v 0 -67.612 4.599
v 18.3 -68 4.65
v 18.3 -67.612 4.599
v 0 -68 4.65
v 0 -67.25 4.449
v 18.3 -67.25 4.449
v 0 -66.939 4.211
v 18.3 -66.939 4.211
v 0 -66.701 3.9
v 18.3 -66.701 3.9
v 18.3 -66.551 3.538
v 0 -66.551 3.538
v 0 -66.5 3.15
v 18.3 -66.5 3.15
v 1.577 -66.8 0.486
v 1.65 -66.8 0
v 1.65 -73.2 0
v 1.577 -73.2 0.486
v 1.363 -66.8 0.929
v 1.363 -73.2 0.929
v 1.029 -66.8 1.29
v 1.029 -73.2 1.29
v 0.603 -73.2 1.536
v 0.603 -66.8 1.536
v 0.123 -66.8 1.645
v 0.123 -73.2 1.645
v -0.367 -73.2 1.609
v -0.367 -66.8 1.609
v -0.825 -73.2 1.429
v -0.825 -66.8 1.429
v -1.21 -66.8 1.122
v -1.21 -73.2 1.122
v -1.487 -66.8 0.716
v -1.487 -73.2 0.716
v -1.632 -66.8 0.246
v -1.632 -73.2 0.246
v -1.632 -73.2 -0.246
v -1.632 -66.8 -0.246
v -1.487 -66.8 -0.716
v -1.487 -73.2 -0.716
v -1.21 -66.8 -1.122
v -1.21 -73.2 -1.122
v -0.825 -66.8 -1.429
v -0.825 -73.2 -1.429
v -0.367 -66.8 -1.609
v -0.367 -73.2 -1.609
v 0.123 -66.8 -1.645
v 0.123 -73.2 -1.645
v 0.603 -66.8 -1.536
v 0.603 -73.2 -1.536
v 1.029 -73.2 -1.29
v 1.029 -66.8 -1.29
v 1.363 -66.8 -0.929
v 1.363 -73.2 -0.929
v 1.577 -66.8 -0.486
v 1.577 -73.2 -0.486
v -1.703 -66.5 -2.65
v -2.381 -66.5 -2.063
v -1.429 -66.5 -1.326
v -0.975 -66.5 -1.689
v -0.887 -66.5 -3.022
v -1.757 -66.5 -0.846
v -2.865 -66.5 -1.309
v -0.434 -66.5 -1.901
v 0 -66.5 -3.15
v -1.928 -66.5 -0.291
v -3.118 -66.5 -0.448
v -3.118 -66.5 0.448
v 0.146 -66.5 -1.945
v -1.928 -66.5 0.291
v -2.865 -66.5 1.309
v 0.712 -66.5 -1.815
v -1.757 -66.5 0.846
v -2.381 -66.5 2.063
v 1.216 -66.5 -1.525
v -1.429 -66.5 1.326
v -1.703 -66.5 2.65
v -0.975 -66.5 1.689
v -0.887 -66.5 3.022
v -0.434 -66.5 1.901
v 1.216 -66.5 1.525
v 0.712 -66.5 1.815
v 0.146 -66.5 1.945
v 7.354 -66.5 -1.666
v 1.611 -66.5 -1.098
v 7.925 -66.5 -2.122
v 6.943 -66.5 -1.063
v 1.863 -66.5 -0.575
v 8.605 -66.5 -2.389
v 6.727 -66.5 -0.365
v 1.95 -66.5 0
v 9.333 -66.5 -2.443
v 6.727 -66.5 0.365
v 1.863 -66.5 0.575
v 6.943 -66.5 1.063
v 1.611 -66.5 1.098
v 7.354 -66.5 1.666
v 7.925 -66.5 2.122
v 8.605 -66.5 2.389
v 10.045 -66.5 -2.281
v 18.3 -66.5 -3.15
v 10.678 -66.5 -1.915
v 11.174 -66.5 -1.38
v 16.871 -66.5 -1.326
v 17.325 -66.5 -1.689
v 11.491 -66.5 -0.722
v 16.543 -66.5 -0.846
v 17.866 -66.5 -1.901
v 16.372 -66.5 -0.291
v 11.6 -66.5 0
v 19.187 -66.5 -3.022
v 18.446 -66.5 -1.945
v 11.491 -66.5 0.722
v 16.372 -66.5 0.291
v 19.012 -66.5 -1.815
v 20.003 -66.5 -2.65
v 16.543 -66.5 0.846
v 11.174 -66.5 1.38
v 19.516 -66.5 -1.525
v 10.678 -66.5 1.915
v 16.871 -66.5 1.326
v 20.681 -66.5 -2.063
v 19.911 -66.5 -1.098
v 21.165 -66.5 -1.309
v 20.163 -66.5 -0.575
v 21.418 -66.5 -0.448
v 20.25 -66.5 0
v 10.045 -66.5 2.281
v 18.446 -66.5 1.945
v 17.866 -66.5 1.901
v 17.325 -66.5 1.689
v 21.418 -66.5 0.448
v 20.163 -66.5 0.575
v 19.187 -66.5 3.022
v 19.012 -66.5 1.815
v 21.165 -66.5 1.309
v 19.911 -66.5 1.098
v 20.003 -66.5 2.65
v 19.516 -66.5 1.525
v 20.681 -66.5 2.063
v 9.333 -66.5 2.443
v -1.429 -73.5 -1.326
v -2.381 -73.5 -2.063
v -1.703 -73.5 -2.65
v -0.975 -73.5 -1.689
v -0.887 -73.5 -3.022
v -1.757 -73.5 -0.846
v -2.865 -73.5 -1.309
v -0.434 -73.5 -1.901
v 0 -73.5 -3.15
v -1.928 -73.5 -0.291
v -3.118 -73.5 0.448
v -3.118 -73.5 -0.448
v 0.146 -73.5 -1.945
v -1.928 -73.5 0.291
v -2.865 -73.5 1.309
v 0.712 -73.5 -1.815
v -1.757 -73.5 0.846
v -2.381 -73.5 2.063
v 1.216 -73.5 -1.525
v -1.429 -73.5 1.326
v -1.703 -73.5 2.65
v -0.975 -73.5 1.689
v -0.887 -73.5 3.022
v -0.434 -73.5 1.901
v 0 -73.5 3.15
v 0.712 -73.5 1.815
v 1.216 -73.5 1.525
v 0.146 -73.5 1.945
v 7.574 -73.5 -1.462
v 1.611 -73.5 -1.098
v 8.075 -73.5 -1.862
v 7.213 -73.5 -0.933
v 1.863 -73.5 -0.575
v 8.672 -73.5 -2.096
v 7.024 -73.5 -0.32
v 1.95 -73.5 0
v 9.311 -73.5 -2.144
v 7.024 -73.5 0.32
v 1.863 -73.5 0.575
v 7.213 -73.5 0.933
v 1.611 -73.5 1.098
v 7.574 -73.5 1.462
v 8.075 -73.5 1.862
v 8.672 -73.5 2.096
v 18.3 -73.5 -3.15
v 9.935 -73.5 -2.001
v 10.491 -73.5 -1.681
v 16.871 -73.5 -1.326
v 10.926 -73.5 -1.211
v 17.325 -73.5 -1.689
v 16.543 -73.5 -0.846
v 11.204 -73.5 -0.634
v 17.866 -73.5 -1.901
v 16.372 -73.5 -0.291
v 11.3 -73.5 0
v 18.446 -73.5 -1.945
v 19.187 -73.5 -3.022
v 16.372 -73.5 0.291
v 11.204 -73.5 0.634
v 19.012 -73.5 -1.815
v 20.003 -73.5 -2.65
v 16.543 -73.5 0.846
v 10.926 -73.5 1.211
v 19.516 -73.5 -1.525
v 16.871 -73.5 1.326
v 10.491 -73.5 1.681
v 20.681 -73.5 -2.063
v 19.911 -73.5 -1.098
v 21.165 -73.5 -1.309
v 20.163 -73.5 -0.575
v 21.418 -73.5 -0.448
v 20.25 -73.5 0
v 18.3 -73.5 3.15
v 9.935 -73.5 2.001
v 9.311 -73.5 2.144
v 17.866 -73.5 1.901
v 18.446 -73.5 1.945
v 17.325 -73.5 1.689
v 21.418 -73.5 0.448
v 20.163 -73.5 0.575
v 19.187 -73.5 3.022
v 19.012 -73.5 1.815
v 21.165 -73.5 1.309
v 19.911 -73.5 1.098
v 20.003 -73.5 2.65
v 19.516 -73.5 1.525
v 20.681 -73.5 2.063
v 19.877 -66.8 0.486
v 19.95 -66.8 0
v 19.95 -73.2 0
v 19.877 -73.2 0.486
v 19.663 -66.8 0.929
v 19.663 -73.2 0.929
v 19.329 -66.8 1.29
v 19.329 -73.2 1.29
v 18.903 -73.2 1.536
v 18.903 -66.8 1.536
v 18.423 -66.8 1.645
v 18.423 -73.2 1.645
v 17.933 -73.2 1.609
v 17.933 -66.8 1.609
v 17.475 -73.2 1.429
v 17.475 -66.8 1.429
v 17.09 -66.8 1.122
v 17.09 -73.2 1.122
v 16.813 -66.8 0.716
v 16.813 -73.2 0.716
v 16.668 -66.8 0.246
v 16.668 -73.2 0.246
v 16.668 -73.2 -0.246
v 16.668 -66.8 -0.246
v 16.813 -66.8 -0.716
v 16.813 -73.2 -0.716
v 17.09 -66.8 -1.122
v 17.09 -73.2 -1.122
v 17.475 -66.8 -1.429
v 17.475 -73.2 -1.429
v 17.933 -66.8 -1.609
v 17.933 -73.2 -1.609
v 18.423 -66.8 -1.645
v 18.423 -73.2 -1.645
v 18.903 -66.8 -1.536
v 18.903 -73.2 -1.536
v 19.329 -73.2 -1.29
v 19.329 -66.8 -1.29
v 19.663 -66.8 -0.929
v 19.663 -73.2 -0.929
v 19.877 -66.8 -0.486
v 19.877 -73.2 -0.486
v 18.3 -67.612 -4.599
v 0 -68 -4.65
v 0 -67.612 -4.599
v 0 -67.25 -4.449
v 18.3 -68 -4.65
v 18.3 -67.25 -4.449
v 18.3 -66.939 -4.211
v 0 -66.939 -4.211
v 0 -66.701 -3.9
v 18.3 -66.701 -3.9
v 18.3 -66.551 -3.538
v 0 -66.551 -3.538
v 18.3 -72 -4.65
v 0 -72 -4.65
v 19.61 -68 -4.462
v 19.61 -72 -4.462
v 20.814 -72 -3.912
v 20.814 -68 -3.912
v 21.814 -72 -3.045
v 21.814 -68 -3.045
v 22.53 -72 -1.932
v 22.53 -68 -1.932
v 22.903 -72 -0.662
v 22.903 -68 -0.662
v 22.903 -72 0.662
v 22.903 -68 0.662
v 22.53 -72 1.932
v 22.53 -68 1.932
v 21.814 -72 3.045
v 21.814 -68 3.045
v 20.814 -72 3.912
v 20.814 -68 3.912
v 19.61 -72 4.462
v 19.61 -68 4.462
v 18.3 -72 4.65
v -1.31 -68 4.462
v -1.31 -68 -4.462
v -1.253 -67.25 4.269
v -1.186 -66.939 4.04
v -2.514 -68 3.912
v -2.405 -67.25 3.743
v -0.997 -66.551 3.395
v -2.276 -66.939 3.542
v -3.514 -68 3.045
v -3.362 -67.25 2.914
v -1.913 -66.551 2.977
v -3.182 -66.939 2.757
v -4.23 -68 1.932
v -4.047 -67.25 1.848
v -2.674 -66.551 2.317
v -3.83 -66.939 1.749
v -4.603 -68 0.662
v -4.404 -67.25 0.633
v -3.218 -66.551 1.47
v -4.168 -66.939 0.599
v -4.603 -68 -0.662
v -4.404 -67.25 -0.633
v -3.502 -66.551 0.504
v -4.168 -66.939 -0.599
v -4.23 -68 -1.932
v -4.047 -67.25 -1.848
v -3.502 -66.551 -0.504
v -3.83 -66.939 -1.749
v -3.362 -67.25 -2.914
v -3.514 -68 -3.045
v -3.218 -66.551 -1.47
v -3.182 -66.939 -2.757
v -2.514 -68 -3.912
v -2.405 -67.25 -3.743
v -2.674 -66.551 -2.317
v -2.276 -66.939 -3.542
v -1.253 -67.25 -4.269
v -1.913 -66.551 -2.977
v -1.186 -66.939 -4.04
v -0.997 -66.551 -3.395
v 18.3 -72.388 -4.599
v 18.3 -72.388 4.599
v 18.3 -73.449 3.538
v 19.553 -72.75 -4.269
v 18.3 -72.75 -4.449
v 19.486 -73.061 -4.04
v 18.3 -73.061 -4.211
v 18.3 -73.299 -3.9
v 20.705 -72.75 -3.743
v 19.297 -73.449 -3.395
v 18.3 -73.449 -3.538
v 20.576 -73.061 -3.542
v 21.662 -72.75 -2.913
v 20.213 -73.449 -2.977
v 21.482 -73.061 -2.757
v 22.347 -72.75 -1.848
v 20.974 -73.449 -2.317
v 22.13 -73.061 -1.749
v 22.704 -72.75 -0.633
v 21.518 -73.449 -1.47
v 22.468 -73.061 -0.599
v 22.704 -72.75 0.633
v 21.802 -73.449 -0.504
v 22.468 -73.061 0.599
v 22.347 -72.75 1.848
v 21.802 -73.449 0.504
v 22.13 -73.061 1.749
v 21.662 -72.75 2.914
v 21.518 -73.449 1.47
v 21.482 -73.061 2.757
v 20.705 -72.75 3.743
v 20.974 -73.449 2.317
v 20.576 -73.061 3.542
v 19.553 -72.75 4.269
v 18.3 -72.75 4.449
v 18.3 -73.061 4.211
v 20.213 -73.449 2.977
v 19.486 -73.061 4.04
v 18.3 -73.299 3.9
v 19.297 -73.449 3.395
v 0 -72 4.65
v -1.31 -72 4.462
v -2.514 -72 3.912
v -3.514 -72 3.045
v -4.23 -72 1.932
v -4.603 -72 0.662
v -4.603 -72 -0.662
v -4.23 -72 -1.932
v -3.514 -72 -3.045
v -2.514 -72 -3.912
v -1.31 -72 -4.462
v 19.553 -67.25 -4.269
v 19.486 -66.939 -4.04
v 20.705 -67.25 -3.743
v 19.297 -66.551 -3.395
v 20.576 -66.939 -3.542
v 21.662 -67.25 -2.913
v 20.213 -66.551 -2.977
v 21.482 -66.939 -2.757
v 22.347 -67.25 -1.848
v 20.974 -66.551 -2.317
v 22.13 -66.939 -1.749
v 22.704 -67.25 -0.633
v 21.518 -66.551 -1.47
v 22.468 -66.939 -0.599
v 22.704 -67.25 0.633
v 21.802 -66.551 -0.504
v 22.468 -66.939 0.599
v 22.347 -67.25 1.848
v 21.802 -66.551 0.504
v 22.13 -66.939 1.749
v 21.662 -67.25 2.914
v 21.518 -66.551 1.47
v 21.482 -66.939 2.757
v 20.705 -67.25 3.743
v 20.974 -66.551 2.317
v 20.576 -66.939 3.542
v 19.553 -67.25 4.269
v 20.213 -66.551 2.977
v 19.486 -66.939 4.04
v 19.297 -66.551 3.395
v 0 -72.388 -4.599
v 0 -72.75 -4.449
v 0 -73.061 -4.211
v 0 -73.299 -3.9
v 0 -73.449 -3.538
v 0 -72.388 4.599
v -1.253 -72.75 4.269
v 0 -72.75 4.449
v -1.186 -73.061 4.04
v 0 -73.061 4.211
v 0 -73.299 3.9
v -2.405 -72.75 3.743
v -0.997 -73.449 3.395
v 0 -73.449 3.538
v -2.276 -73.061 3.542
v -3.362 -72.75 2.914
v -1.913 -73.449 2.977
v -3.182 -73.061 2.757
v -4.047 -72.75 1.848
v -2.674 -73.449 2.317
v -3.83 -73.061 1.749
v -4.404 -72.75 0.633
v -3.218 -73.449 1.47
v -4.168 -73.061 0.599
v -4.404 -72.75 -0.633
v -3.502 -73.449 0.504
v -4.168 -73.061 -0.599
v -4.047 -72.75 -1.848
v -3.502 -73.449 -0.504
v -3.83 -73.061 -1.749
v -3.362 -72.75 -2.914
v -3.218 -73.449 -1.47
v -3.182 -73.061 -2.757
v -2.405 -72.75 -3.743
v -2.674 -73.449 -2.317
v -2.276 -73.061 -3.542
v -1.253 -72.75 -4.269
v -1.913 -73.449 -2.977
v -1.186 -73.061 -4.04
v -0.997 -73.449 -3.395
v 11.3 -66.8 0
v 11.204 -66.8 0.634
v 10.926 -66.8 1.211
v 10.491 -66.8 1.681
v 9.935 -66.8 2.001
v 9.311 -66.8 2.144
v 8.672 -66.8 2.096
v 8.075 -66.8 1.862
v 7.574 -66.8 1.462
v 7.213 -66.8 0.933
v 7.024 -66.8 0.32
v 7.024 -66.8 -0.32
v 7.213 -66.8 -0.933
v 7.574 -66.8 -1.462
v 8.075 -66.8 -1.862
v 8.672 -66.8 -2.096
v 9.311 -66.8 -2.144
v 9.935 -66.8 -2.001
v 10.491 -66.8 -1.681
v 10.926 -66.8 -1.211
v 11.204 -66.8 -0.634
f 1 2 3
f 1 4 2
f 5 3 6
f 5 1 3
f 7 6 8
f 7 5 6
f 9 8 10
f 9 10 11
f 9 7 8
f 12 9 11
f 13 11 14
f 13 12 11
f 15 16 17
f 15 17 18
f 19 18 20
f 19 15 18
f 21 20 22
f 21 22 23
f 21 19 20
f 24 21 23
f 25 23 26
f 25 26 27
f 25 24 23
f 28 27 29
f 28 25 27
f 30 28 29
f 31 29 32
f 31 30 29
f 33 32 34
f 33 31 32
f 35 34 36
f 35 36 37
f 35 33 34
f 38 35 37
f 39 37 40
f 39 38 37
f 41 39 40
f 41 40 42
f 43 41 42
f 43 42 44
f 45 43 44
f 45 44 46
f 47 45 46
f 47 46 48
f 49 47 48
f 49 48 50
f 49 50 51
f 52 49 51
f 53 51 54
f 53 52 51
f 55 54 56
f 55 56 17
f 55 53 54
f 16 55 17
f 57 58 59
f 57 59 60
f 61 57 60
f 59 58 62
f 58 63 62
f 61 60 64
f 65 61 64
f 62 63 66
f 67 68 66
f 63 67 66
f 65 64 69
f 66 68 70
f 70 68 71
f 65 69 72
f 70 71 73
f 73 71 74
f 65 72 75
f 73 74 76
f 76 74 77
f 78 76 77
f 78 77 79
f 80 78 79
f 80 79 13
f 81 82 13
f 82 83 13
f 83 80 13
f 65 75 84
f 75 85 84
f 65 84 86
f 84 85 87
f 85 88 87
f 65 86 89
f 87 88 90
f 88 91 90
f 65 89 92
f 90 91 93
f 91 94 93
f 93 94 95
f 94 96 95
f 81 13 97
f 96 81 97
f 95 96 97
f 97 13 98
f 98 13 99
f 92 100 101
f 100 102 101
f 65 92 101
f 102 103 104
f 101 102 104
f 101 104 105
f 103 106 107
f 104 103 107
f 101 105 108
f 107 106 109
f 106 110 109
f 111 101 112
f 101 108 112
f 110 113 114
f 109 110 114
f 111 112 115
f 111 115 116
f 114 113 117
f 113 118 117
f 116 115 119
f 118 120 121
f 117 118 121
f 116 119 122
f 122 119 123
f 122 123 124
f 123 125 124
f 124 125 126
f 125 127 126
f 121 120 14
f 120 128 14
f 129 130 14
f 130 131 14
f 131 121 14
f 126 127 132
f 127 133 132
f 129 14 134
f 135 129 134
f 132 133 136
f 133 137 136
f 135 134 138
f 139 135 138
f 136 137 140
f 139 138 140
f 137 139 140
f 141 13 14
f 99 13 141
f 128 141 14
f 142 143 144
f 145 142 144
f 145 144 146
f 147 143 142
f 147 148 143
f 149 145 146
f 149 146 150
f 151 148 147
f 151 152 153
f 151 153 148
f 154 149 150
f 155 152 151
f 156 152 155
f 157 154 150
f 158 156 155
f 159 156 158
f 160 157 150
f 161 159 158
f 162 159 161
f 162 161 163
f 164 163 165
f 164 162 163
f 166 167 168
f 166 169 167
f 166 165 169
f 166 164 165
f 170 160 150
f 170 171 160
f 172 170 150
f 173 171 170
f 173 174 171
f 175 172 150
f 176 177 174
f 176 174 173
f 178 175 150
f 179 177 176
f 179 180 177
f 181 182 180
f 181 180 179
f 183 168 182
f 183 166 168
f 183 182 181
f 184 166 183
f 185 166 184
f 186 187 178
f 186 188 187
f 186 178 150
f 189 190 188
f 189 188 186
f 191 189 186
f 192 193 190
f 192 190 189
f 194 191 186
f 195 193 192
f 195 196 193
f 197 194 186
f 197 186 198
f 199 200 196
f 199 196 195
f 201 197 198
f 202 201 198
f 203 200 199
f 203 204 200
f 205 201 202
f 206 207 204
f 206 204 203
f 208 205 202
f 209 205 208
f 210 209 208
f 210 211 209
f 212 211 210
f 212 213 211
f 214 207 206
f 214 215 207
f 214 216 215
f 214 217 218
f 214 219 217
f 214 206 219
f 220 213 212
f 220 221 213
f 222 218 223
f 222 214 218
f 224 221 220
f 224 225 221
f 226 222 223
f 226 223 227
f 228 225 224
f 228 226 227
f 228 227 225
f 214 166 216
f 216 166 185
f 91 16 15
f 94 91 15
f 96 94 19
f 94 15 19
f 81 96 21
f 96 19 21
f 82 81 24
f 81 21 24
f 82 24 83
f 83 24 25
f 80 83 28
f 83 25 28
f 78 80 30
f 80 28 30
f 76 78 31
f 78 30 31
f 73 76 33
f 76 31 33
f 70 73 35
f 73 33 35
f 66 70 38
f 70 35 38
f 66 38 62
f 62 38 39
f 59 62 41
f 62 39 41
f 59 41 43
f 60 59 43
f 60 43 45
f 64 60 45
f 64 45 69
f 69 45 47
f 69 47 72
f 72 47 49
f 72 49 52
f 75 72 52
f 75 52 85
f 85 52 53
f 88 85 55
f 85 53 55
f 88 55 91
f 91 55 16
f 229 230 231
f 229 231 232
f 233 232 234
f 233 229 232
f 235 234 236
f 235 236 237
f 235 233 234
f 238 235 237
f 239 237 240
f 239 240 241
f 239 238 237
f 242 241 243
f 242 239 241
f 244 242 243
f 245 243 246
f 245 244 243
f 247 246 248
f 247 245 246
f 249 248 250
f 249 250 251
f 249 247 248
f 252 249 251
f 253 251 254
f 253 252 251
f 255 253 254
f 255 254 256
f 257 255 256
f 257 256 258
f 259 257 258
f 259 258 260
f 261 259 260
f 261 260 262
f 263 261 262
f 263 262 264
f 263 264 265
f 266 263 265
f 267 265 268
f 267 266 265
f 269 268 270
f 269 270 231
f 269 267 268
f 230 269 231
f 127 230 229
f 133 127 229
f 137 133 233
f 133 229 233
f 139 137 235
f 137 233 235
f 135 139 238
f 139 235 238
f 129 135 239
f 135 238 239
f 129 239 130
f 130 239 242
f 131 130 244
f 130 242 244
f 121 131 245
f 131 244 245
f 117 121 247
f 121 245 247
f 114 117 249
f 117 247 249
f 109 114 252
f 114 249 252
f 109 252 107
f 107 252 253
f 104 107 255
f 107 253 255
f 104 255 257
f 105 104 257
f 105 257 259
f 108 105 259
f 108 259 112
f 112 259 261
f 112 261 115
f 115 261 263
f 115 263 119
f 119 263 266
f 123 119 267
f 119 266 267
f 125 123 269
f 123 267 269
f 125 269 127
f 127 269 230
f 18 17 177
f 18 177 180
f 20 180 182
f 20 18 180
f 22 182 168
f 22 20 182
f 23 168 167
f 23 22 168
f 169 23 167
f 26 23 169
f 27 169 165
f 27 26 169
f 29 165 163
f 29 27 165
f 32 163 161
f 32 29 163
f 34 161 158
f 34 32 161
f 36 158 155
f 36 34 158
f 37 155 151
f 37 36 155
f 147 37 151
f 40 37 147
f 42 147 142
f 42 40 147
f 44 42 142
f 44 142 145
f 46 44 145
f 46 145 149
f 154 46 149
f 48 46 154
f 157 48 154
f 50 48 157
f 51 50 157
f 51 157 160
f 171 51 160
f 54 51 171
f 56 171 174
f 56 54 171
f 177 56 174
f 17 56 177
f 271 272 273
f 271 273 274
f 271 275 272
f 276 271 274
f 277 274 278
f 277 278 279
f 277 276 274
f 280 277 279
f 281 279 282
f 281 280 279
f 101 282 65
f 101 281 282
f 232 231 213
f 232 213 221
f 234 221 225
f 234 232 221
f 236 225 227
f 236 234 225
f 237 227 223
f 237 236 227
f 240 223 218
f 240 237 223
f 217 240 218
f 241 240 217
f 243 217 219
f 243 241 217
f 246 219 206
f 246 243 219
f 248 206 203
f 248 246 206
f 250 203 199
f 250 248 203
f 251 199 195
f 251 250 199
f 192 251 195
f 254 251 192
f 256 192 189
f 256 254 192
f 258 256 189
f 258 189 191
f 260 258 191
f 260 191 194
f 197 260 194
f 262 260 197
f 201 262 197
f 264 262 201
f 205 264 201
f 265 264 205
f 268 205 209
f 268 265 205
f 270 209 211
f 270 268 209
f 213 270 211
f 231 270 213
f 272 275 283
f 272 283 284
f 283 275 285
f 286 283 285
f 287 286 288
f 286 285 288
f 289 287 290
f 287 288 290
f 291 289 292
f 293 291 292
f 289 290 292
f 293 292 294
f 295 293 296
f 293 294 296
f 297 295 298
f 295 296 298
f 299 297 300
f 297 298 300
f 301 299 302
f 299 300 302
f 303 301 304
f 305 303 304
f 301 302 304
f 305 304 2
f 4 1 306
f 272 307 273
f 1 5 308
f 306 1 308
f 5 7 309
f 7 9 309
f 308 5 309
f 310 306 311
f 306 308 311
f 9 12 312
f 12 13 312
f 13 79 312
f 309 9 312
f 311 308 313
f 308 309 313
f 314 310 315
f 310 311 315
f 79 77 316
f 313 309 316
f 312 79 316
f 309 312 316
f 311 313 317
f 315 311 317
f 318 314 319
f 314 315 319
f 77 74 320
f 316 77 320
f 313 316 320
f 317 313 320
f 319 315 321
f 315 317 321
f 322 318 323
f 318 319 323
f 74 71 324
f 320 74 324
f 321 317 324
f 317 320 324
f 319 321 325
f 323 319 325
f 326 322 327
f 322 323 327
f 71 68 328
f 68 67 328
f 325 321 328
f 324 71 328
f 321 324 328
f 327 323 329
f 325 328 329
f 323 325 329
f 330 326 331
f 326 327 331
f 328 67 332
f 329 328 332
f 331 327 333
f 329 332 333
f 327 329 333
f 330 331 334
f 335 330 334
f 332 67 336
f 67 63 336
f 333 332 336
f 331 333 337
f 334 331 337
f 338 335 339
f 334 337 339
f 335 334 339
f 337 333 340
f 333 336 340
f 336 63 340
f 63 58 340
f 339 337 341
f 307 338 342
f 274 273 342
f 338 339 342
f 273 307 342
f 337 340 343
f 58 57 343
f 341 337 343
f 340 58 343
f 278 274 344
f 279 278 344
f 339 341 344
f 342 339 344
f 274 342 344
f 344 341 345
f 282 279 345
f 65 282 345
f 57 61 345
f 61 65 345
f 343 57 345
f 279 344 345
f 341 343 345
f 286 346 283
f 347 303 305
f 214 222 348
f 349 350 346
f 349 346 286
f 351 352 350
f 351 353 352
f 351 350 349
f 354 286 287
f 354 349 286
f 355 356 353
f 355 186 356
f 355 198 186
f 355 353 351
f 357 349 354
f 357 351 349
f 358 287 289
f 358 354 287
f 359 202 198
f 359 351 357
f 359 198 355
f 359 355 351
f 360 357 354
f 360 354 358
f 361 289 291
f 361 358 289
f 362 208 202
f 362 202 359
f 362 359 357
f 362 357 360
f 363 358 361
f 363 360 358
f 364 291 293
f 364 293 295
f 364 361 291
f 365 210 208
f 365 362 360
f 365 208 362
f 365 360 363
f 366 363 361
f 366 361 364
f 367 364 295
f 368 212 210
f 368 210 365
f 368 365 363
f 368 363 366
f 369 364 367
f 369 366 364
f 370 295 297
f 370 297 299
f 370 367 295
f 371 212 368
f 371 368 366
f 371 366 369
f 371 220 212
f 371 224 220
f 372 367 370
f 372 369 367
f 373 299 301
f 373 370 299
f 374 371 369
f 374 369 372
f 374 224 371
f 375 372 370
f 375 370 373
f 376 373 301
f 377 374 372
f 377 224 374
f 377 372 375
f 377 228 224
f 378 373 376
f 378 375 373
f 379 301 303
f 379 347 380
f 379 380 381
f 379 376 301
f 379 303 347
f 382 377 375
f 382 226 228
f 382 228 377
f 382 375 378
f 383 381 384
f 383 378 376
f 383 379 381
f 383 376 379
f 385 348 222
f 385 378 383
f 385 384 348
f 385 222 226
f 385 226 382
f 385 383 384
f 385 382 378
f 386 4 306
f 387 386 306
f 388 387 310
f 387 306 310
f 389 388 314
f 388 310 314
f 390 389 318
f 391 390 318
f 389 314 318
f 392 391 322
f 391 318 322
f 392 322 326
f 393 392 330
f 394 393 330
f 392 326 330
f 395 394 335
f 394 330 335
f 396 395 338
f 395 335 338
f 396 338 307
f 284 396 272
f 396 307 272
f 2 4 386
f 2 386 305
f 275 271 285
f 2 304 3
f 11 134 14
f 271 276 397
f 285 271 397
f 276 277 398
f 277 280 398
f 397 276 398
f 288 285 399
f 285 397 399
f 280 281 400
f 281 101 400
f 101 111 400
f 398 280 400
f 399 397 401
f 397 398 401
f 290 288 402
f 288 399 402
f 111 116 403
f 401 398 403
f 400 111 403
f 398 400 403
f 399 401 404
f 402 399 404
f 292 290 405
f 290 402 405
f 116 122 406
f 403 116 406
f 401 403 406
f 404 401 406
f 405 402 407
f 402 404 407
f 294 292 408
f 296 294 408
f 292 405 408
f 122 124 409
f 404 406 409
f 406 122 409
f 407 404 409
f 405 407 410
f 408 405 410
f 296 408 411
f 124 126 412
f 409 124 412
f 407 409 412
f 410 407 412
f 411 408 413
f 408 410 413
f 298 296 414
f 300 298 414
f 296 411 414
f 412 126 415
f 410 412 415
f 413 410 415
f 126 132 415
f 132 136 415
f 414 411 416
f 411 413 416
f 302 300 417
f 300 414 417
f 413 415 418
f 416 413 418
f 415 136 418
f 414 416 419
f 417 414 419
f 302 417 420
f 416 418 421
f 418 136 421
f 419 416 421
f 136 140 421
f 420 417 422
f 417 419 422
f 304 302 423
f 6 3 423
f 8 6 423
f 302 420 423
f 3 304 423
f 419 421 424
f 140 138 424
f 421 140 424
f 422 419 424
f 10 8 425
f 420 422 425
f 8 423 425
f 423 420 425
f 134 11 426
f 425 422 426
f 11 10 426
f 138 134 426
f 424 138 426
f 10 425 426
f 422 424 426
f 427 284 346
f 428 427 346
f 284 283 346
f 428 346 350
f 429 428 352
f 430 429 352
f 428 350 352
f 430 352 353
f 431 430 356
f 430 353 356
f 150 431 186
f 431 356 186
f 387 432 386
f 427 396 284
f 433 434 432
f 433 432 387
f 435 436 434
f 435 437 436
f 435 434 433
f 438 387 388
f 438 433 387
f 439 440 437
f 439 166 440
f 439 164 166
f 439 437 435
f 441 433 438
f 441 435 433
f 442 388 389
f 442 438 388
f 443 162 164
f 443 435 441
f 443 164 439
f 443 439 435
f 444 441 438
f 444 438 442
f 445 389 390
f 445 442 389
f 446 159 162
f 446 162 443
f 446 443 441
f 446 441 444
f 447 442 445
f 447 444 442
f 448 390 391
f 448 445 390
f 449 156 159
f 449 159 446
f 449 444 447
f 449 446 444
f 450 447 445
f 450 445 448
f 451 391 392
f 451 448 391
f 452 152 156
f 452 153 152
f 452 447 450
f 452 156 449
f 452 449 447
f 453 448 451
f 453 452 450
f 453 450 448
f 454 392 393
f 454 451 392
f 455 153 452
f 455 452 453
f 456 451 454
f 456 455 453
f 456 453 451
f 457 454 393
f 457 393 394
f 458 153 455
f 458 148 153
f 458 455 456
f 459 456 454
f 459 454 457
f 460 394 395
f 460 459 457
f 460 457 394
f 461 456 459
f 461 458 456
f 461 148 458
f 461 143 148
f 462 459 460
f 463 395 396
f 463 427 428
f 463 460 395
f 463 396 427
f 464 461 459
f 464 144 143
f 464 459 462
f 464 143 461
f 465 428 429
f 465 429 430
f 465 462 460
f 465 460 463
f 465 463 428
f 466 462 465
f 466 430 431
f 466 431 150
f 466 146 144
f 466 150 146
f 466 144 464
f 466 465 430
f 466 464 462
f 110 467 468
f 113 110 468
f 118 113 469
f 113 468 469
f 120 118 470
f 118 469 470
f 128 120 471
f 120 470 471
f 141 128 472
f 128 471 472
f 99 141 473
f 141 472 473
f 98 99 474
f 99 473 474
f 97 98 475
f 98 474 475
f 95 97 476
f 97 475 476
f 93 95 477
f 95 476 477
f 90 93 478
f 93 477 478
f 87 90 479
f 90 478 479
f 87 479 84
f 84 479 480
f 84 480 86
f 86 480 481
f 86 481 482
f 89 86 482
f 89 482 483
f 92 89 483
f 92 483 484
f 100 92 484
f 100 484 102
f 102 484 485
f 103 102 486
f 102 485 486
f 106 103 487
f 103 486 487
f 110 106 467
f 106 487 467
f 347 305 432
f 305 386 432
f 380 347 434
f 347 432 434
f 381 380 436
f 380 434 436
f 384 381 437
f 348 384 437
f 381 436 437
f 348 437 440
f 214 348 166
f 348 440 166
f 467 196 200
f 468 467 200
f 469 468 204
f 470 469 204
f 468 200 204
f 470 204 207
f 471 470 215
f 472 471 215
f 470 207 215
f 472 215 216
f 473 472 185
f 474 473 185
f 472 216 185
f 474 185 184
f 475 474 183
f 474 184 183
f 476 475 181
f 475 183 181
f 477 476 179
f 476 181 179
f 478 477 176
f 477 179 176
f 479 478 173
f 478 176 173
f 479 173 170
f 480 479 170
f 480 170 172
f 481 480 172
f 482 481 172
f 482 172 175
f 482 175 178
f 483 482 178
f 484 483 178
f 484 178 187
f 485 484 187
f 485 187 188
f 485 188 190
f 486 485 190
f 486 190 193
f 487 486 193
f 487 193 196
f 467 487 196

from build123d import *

# Parameters (mm, degrees)
SKETCH003_R     = 1.65
PAD002_DEPTH    = 7
SKETCH004_R     = 2.15
POCKET003_DEPTH = 8
FILLET001_R     = 1.5
CHAMFER001_SIZE = 0.3


with BuildPart() as part:
    # Sketch003 → Pad002 (new body)
    with BuildSketch(Plane.XZ):
        with BuildLine():
            ThreePointArc((0, 4.65), (-4.65, 0), (0, -4.65))
            Line((18.300003, -4.65), (0, -4.65))
            ThreePointArc((18.300003, -4.65), (22.95, 2e-06), (18.3, 4.65))
            Line((0, 4.65), (18.3, 4.65))
        make_face()
        Circle(SKETCH003_R, mode=Mode.SUBTRACT)
        with Locations((18.3, 0)):
            Circle(SKETCH003_R, mode=Mode.SUBTRACT)
    extrude(amount=PAD002_DEPTH)

    # Sketch004 (on Face8 of Pad002) → Pocket003 (cut)
    with BuildSketch(Plane.XZ.offset(7)):
        with Locations((9.15, 0)):
            Circle(SKETCH004_R)
    extrude(amount=-POCKET003_DEPTH, mode=Mode.SUBTRACT)

    # Fillet001
    fillet001_edges = [part.edges().sort_by_distance(p)[0] for p in [
        (-4.65, -7, 0),
        (-4.65, 0, 0),
    ]]
    fillet(fillet001_edges, radius=FILLET001_R)

    # Chamfer001
    chamfer001_edges = [part.edges().sort_by_distance(p)[0] for p in [
        (-1.65, -7, 0),
        (16.65, -7, 0),
        (7, 0, 0),
        (-1.65, 0, 0),
        (16.65, 0, 0),
    ]]
    chamfer(chamfer001_edges, length=CHAMFER001_SIZE)


with BuildPart() as part_1:
    # Body001 placement: moved
    add(part.part.moved(Location((0, -66.5, 0))))


solid = part_1.part
